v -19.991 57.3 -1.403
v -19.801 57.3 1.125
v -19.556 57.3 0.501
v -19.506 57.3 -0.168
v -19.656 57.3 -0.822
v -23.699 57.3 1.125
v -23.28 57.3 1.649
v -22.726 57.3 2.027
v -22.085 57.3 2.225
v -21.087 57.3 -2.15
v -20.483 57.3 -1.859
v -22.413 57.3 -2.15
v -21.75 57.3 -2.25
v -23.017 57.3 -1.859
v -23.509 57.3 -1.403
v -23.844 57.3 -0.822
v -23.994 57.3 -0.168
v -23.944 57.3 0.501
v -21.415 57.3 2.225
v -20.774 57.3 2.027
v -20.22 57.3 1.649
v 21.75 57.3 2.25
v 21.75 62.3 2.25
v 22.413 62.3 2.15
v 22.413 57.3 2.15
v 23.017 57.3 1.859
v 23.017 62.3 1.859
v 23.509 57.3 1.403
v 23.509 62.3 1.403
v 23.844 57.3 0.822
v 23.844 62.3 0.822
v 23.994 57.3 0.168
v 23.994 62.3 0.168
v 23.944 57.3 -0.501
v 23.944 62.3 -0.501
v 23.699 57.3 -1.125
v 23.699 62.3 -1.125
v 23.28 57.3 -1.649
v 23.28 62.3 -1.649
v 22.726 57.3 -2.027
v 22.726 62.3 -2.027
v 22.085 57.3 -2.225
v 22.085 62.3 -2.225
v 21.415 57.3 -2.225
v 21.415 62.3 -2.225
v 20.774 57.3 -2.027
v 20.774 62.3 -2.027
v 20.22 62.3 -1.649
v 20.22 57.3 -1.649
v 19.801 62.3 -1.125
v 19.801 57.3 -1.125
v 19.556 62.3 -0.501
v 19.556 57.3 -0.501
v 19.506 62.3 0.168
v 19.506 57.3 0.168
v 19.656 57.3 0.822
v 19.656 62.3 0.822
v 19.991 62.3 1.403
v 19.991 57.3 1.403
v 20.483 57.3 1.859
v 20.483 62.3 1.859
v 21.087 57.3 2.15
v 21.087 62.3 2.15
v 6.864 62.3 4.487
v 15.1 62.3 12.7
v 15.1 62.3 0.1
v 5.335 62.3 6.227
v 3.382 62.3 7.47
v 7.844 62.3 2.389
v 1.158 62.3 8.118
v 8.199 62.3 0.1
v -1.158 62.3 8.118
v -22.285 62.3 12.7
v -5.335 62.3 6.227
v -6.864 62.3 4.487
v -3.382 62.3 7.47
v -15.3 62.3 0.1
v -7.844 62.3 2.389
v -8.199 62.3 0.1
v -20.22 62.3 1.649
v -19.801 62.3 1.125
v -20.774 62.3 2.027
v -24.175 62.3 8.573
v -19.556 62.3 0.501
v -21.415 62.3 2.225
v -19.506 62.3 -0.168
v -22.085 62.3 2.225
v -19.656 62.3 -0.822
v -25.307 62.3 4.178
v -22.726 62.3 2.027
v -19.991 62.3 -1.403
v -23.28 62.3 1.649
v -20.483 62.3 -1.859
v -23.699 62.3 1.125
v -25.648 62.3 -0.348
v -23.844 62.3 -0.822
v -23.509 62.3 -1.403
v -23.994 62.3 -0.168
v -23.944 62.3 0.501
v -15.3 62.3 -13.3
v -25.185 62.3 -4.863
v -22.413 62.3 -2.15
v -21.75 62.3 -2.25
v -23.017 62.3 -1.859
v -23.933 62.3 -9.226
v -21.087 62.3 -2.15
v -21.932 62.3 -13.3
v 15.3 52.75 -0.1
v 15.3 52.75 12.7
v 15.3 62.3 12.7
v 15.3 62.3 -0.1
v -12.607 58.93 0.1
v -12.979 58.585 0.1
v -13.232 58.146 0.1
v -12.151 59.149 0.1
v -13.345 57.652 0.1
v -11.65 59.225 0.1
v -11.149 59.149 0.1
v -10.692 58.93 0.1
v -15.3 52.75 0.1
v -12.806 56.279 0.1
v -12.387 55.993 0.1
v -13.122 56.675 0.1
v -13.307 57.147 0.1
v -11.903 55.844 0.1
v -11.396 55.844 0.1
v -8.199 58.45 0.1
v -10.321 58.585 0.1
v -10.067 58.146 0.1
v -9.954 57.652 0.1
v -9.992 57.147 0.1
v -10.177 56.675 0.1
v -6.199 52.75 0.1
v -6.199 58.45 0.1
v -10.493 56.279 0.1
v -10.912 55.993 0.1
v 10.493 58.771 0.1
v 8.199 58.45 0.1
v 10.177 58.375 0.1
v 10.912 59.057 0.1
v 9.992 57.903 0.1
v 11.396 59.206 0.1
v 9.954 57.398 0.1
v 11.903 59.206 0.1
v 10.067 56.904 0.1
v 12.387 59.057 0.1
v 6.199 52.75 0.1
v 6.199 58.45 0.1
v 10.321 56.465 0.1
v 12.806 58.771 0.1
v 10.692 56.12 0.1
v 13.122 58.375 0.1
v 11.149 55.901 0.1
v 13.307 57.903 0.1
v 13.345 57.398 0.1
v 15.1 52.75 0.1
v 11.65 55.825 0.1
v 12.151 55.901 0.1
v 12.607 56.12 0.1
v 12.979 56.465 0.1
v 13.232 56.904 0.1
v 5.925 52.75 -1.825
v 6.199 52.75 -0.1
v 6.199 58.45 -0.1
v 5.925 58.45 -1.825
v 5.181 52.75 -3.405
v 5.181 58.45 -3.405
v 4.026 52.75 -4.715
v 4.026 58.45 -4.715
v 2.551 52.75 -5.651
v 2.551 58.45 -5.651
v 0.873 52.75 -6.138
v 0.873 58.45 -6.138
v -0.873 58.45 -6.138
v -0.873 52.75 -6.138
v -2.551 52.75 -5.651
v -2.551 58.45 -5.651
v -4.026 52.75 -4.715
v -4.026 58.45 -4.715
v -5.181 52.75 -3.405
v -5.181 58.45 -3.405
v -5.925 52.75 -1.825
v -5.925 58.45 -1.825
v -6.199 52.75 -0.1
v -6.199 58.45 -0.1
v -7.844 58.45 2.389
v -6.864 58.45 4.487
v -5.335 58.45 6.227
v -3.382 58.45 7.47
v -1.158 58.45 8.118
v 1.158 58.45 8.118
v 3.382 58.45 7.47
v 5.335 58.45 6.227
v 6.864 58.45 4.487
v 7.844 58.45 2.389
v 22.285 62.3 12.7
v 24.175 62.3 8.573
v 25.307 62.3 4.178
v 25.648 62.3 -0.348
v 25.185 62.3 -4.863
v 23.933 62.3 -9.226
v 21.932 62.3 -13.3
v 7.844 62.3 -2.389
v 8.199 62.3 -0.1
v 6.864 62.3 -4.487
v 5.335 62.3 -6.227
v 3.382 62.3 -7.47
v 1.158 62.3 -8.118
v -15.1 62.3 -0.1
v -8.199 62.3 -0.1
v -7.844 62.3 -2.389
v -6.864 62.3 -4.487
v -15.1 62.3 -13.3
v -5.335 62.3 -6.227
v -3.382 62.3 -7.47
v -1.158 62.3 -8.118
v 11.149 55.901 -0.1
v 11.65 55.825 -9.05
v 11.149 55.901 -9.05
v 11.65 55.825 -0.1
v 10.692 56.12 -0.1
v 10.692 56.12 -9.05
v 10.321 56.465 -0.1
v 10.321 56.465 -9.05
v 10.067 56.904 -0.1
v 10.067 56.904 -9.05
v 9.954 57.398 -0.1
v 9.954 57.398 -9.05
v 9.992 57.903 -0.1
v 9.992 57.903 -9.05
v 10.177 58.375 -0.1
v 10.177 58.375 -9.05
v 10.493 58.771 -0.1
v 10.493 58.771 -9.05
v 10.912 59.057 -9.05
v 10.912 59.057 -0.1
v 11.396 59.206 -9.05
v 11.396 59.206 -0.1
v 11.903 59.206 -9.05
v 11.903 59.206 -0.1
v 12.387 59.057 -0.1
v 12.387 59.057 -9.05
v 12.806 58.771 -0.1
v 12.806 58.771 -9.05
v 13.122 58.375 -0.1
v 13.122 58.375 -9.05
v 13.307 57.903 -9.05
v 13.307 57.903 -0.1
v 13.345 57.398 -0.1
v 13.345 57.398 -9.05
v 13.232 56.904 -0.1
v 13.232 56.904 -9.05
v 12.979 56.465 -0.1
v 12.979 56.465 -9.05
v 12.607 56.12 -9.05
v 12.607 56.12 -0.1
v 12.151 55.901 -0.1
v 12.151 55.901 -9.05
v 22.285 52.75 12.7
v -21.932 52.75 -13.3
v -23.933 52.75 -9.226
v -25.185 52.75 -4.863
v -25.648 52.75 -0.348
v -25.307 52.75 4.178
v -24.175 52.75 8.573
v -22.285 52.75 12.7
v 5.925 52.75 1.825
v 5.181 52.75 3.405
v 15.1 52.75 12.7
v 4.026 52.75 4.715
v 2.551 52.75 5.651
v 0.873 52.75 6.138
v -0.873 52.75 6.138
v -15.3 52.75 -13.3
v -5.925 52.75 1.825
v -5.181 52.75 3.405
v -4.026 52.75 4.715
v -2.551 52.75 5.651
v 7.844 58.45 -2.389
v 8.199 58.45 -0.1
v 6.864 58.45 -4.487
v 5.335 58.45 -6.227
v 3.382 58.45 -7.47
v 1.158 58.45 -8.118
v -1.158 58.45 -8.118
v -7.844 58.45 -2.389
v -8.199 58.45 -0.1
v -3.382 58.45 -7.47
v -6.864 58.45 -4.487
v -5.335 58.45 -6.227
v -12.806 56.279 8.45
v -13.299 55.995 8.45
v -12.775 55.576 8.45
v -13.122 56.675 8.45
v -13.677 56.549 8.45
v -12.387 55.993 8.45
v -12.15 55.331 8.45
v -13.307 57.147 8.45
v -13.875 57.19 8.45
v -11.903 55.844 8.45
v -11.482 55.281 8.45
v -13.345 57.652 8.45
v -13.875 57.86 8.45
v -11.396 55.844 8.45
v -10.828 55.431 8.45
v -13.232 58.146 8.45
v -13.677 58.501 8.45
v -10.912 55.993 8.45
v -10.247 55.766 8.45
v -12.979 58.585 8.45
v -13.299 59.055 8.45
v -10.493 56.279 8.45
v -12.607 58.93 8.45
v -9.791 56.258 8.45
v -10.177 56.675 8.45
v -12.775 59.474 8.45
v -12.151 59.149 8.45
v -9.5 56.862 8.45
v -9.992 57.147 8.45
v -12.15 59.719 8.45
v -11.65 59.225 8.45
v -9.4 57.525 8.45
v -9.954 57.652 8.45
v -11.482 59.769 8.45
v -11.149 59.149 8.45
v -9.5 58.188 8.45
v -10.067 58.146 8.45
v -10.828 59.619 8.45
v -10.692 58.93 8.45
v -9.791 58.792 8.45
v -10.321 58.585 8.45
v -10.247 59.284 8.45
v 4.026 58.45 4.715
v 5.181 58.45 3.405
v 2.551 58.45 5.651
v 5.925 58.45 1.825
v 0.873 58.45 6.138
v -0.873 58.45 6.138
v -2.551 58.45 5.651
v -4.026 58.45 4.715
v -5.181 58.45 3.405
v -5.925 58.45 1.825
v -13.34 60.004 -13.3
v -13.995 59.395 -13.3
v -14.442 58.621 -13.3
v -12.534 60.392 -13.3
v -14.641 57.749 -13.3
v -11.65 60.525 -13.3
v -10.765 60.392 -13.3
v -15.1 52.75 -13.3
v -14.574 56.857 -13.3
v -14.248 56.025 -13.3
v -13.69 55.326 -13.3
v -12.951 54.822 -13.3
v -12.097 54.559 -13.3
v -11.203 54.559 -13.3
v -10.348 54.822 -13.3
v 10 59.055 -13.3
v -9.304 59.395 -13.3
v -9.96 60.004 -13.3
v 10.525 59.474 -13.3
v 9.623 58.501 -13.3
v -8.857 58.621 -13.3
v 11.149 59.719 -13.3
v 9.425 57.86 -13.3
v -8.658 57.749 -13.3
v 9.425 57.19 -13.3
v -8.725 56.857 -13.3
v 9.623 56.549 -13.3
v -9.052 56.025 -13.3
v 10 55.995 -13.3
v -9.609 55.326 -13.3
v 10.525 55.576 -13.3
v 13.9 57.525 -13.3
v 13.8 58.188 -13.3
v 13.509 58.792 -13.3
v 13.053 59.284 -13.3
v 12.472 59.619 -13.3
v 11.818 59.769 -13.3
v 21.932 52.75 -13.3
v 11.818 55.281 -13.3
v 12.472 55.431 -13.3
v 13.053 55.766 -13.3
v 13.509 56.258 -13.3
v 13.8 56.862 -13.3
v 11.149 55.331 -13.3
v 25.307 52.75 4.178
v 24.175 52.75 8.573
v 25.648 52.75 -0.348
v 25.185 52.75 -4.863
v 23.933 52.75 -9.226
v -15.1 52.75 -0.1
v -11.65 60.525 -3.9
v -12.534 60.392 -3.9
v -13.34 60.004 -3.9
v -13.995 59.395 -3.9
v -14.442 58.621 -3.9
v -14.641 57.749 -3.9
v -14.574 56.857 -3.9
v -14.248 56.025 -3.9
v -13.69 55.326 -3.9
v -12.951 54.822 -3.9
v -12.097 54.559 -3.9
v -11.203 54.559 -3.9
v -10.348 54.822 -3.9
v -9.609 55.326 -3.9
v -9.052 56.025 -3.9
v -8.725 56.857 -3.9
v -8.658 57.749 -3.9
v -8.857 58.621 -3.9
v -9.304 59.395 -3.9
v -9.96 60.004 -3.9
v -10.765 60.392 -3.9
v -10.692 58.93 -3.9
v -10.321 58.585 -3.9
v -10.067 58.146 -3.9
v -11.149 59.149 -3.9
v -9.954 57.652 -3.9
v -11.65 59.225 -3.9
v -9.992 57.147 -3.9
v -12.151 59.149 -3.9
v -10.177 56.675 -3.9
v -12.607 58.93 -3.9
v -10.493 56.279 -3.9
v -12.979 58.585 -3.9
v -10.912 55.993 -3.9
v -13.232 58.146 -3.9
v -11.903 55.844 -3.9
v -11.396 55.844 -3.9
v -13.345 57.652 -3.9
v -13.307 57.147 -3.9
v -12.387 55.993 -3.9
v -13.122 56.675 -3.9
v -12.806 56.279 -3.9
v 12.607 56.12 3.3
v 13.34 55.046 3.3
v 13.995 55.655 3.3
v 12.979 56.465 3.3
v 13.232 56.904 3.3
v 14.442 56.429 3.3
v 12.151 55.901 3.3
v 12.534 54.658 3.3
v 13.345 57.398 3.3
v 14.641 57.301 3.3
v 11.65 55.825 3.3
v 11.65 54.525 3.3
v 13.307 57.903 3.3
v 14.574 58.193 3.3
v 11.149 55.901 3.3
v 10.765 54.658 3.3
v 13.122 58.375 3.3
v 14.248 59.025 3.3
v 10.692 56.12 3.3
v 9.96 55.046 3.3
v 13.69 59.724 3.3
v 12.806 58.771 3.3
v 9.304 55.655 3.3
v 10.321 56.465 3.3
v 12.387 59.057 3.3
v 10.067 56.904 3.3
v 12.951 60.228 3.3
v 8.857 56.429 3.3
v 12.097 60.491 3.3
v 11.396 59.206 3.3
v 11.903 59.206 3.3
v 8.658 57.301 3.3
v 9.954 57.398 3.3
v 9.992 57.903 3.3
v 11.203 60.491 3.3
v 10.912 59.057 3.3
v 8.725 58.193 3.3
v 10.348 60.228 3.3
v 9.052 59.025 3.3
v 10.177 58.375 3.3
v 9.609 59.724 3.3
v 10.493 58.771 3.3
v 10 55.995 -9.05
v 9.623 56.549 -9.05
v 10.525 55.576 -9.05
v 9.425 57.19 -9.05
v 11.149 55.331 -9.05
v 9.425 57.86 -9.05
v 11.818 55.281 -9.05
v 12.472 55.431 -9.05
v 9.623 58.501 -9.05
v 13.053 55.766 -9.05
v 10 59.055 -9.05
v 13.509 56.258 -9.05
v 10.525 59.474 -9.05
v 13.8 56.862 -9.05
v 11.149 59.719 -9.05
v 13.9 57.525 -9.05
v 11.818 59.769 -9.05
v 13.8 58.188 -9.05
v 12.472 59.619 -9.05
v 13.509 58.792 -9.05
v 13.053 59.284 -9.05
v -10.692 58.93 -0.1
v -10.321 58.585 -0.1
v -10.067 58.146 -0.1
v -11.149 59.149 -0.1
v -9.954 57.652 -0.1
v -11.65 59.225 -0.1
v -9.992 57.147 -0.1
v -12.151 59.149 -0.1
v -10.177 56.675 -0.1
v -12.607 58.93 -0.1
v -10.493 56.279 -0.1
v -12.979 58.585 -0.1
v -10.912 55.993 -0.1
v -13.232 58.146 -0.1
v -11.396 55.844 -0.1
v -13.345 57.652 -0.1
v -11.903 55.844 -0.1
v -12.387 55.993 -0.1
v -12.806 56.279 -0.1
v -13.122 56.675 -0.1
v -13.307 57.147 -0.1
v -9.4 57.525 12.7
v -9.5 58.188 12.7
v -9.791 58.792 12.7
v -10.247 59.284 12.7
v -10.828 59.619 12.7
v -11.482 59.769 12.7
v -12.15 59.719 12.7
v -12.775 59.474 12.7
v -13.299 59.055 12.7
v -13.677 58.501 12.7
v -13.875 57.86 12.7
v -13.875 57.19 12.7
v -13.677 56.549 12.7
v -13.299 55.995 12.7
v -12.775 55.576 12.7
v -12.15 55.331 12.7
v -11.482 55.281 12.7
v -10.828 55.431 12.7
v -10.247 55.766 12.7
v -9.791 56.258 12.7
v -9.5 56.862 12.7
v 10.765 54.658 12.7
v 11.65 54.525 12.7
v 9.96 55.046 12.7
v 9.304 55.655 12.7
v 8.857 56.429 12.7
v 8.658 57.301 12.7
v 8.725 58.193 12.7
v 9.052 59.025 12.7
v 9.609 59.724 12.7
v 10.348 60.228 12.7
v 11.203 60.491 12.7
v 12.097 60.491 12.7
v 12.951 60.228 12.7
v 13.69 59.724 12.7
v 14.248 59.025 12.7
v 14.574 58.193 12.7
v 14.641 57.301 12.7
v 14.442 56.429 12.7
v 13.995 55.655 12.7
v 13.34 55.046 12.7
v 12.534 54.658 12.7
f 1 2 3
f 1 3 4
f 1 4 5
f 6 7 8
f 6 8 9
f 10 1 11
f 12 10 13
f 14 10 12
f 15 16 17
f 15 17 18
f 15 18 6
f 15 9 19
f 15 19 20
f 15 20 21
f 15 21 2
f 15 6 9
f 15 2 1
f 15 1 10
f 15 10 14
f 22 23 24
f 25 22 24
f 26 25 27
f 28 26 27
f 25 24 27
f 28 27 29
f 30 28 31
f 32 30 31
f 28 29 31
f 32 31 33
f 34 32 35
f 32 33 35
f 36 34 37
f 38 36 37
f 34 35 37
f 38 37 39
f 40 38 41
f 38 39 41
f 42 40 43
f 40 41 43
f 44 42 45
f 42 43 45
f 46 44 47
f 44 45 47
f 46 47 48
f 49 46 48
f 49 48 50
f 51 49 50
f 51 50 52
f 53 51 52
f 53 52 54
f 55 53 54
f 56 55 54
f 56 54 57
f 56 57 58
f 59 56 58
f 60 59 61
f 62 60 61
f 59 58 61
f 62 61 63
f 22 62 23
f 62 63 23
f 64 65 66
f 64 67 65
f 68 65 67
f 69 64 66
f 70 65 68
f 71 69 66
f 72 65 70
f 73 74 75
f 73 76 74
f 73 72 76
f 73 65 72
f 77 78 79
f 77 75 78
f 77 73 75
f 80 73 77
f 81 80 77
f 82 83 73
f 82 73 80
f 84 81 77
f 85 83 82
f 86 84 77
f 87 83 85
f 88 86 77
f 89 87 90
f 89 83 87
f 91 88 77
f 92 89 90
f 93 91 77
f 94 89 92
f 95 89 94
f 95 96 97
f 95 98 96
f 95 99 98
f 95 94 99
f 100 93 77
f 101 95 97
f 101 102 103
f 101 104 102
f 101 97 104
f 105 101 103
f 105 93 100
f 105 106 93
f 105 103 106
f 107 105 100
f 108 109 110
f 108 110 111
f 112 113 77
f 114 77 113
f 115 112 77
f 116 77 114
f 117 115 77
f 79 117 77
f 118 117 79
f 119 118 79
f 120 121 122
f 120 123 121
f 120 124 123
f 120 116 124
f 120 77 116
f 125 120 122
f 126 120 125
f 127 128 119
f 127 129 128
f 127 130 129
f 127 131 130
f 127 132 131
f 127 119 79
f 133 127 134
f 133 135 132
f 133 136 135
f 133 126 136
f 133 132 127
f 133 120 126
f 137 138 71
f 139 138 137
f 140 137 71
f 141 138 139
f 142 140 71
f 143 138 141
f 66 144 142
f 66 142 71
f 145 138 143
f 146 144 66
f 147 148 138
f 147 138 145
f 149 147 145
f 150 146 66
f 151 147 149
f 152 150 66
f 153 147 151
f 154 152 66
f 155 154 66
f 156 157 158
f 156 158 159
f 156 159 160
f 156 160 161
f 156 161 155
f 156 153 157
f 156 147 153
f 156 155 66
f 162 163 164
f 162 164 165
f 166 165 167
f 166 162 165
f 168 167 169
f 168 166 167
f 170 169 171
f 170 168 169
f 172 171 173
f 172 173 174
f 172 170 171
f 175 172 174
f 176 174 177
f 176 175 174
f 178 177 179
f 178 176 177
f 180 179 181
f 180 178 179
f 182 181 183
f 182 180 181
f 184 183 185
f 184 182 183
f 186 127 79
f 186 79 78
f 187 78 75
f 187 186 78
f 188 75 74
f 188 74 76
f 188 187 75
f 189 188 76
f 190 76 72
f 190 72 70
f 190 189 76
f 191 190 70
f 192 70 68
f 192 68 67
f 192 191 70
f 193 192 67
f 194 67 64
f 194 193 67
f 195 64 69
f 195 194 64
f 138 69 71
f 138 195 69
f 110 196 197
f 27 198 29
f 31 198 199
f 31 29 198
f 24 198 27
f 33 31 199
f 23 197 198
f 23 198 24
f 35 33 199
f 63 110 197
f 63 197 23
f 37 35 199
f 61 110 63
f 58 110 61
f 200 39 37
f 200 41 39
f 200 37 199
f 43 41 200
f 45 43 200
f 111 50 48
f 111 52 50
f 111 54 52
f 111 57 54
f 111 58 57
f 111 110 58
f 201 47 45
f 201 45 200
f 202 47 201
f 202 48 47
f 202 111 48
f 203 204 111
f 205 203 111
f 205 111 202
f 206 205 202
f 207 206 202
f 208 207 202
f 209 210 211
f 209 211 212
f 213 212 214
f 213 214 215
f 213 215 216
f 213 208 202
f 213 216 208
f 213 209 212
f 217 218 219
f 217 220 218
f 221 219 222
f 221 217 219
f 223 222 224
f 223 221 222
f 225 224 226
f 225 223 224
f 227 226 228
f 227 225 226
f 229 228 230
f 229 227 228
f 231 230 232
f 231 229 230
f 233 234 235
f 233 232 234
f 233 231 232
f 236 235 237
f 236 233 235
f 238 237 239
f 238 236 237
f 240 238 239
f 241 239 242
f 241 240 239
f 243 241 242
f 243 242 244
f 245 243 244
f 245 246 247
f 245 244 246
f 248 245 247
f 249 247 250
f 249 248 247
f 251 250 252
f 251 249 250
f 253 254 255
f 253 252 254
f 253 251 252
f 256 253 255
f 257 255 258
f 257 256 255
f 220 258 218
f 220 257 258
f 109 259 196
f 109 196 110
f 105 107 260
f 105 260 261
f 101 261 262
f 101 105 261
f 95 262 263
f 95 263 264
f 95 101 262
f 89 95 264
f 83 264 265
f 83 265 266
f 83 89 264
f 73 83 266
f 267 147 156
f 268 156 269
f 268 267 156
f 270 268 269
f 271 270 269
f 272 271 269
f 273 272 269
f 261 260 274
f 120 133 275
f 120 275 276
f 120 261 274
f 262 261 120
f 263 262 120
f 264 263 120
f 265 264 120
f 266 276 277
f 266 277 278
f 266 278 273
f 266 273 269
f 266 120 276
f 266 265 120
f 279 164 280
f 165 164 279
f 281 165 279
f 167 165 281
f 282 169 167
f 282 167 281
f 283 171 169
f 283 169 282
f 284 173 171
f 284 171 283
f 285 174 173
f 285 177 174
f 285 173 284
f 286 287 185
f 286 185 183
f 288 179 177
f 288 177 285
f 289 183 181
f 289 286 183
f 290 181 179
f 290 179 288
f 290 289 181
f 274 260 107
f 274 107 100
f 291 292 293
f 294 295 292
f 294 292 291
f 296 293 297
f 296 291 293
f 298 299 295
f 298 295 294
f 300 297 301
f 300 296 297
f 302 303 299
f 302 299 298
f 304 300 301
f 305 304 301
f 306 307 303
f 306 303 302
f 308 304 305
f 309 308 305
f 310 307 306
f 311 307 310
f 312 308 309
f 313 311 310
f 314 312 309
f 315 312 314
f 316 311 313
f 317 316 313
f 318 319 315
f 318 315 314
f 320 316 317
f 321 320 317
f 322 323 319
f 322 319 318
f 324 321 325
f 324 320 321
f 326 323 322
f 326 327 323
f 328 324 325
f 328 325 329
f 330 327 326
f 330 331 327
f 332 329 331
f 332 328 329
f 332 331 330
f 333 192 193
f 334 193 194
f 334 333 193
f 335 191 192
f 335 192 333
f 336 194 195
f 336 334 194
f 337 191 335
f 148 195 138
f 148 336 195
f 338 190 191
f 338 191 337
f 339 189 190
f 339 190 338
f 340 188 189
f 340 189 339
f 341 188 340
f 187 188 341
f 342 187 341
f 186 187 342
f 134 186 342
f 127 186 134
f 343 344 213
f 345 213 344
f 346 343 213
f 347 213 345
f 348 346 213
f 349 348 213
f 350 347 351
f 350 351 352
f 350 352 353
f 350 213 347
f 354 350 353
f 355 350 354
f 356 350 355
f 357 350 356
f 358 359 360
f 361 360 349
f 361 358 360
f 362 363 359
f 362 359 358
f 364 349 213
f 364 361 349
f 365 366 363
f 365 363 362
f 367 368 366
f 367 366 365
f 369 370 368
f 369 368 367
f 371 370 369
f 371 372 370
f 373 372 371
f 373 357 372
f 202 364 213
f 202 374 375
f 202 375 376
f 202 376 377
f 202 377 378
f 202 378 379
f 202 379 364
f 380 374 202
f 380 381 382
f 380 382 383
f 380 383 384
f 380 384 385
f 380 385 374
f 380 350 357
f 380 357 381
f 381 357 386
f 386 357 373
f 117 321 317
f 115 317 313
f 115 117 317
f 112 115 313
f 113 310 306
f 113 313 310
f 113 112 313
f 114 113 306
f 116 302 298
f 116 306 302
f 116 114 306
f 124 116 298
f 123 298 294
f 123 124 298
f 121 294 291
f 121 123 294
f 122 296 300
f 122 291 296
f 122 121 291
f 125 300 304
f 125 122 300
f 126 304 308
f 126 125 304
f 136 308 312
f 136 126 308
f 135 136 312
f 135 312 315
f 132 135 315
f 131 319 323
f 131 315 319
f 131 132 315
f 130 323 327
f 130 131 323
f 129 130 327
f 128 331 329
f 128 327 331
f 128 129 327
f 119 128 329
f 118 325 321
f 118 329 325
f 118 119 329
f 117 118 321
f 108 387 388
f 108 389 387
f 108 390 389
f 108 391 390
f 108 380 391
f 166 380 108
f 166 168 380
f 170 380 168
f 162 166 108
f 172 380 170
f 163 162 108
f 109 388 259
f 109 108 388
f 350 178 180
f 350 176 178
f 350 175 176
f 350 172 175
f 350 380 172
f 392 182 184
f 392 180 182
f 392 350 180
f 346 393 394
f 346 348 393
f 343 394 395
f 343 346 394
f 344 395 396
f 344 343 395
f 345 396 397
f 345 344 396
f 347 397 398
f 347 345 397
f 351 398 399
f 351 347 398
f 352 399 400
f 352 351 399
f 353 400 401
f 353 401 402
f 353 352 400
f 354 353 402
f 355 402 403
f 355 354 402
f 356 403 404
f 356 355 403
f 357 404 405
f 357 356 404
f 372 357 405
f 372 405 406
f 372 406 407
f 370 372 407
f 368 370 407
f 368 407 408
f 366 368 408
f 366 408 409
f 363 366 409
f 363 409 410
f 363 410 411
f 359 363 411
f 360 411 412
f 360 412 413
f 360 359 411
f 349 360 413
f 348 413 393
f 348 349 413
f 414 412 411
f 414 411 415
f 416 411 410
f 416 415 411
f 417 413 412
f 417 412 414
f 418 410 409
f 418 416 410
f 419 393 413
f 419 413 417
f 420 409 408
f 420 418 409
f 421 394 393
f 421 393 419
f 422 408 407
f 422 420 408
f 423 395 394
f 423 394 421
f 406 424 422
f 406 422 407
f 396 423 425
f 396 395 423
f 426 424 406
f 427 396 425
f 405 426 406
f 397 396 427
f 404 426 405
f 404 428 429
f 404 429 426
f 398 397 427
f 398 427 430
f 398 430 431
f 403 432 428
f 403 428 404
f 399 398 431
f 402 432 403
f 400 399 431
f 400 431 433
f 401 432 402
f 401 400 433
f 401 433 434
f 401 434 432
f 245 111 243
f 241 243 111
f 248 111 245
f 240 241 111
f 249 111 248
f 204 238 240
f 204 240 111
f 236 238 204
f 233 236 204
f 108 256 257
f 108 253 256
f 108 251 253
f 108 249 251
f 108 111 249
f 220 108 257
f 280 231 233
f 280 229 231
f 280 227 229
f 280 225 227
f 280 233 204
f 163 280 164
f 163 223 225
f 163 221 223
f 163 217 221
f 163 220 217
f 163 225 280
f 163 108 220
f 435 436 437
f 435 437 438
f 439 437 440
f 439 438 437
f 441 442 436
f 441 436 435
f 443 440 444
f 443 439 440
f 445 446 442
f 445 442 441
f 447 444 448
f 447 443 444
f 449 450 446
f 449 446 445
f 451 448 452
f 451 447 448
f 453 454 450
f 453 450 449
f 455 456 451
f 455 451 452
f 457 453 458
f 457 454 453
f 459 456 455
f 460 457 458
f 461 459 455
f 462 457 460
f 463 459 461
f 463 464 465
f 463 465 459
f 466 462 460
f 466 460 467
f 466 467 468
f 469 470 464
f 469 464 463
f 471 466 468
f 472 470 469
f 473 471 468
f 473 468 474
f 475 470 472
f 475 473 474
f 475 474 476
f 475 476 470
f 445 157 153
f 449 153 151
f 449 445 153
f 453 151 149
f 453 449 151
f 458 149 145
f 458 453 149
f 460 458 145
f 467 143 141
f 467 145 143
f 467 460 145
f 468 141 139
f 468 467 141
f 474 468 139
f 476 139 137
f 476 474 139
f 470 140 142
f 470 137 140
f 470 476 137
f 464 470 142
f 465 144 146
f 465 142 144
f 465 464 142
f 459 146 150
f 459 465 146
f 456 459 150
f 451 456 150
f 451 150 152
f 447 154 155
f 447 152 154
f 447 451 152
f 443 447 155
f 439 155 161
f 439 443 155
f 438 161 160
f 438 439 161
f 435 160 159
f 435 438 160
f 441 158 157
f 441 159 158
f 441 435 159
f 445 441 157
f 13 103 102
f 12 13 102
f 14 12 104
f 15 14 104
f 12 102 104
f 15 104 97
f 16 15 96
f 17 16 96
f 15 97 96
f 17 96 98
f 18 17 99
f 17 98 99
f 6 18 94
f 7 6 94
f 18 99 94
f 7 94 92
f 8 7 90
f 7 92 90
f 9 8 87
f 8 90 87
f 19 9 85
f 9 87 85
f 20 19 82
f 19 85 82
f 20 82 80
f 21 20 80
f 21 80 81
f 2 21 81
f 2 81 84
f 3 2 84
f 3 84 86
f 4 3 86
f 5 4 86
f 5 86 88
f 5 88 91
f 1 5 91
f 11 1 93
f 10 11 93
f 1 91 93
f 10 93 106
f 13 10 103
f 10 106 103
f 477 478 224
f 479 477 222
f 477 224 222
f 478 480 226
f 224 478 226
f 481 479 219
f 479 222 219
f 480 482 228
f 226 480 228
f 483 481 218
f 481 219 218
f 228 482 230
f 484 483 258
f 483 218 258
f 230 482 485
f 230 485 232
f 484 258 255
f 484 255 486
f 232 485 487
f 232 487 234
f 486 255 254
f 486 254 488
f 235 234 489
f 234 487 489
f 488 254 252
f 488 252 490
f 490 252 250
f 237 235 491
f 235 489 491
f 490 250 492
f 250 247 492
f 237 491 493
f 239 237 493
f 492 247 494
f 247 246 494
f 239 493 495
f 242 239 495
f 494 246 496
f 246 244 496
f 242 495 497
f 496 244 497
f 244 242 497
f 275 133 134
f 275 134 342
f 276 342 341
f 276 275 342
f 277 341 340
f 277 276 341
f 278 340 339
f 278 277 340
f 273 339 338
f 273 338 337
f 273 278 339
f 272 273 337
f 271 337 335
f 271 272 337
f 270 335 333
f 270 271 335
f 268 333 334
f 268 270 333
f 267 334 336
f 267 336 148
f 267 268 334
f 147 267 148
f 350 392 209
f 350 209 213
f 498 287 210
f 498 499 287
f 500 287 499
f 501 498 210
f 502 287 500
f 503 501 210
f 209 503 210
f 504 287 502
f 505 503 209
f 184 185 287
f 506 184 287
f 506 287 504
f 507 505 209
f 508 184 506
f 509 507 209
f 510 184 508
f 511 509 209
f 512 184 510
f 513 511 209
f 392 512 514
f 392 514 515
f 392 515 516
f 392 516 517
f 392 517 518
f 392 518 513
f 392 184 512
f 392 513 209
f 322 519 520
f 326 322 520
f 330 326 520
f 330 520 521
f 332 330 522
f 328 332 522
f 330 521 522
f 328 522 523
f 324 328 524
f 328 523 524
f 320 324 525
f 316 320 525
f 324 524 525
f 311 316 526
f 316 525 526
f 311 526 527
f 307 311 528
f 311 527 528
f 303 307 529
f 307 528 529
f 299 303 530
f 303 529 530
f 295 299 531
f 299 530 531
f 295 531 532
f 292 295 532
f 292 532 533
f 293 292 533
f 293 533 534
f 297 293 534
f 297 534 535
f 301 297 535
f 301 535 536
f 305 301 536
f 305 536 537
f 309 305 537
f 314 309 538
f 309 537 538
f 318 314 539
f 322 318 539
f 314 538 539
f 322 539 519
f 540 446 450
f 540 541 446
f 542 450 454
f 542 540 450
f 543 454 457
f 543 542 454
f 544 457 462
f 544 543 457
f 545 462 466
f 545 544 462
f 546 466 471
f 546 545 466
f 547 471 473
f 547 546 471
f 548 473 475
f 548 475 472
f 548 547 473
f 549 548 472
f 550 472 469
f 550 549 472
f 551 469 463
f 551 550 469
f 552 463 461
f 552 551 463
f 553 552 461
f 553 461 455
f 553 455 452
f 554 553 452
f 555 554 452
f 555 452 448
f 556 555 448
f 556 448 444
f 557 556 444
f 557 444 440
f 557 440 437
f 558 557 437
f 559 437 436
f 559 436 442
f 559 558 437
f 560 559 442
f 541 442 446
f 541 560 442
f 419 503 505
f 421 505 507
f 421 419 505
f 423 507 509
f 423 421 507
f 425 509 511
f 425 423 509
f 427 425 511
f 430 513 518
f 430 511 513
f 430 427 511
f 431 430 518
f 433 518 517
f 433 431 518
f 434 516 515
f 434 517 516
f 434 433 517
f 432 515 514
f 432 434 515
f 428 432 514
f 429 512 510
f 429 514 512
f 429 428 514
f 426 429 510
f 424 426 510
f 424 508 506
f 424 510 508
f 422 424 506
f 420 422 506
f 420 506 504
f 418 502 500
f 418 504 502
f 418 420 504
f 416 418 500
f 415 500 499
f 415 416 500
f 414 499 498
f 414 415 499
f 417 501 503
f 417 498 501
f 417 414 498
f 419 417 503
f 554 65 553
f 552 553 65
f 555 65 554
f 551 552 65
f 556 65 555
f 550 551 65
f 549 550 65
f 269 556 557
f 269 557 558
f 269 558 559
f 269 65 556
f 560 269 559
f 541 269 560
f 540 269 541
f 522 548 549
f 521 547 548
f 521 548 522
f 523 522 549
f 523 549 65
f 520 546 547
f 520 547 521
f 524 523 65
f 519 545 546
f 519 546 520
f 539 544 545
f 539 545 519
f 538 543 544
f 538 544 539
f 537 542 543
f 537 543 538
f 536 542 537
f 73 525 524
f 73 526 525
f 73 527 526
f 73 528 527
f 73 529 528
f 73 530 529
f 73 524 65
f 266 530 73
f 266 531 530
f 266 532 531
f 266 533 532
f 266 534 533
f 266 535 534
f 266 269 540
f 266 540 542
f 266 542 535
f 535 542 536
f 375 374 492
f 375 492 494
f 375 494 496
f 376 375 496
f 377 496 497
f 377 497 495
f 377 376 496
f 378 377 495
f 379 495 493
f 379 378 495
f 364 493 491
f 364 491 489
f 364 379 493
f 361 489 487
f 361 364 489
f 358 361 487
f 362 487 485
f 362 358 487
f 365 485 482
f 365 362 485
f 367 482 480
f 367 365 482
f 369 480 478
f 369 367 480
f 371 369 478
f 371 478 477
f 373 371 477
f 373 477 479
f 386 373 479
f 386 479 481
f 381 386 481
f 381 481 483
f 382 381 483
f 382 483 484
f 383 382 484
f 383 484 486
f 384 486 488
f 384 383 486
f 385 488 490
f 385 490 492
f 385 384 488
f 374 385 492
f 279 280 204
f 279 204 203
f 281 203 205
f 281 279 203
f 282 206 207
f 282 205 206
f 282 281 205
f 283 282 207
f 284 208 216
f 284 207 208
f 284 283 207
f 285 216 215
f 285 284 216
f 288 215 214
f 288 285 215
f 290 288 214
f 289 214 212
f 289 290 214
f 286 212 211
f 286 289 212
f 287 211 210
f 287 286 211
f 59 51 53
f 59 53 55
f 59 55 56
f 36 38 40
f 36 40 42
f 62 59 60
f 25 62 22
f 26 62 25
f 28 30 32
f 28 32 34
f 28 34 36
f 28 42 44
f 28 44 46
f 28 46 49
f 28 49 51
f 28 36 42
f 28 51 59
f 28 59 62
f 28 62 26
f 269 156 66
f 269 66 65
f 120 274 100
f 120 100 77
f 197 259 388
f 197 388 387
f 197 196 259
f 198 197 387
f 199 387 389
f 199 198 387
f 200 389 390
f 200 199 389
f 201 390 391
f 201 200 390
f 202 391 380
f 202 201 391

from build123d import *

# Parameters (mm, degrees)
CUT_EXTRUDE1_DEPTH      = 38.510631826
CUT_EXTRUDE1_DEPTH_BACK = 38.510631826
SKETCH14_R              = 2.25
CUT_EXTRUDE4_DEPTH      = 4.25
CUT_EXTRUDE5_START      = -26
SKETCH14_3_R            = 2.25
CUT_EXTRUDE5_DEPTH      = 4.25
SKETCH15_R              = 2.25
CUT_EXTRUDE6_DEPTH      = 5


with BuildPart() as part:
    # Sketch1 → Revolve1 (revolve)
    with BuildSketch(Plane.XY, mode=Mode.PRIVATE) as revolve1_sk:
        Polygon((6.2, 58.45), (6.2, 52.75), (25.65, 52.75), (25.65, 62.3), (8.2, 62.3), (8.2, 58.45), align=None)
    revolve(revolve1_sk.sketch.rotate(Axis((0, 0, 0), (0, 1, 0)), 90), axis=Axis((0, 0, 0), (0, 1, 0)))

    # Sketch2 → Cut-Extrude1 (cut, two sides: drawn at the far end of the back side and taken through both)
    with BuildSketch(Plane(origin=(0, 62.3, 0), x_dir=(1, 0, 0), z_dir=(0, 1, 0)).offset(-CUT_EXTRUDE1_DEPTH_BACK)):
        with BuildLine():
            Line((15.1, -12.7), (-22.285252971, -12.7))
            ThreePointArc((-22.285252971, -12.7), (0, -25.65), (22.285252971, -12.7))
            Line((22.285252971, -12.7), (15.3, -12.7))
            Line((15.3, -12.7), (15.2, -12.7))
            Line((15.2, -12.7), (15.1, -12.7))
        make_face()
        with BuildLine():
            ThreePointArc((21.932453123, 13.3), (0, 25.65), (-21.932453123, 13.3))
            Line((-21.932453123, 13.3), (-15.3, 13.3))
            Line((-15.3, 13.3), (-15.2, 13.3))
            Line((-15.2, 13.3), (-15.1, 13.3))
            Line((-15.1, 13.3), (21.932453123, 13.3))
        make_face()
        with BuildLine():
            Line((-8.199390221, -0.1), (8.199390221, -0.1))
            ThreePointArc((8.199390221, -0.1), (8.199847554, -0.05000093), (8.2, 0))
            Line((8.2, 0), (-8.2, 0))
            ThreePointArc((-8.2, 0), (-8.199847554, -0.05000093), (-8.199390221, -0.1))
        make_face()
        with BuildLine():
            Line((-8.2, 0), (8.2, 0))
            ThreePointArc((8.2, 0), (8.199847554, 0.05000093), (8.199390221, 0.1))
            Line((8.199390221, 0.1), (-8.199390221, 0.1))
            ThreePointArc((-8.199390221, 0.1), (-8.199847554, 0.05000093), (-8.2, 0))
        make_face()
        with BuildLine():
            Line((-15.2, 13.3), (-15.3, 13.3))
            Line((-15.3, 13.3), (-15.3, -0.1))
            Line((-15.3, -0.1), (-8.199390221, -0.1))
            ThreePointArc((-8.199390221, -0.1), (-8.199847554, -0.05000093), (-8.2, 0))
            Line((-8.2, 0), (-15.2, 0))
            Line((-15.2, 0), (-15.2, 13.3))
        make_face()
        with BuildLine():
            Line((-15.1, 13.3), (-15.2, 13.3))
            Line((-15.2, 13.3), (-15.2, 0))
            Line((-15.2, 0), (-8.2, 0))
            ThreePointArc((-8.2, 0), (-8.199847554, 0.05000093), (-8.199390221, 0.1))
            Line((-8.199390221, 0.1), (-15.1, 0.1))
            Line((-15.1, 0.1), (-15.1, 13.3))
        make_face()
        with BuildLine():
            Line((15.1, -0.1), (15.1, -12.7))
            Line((15.1, -12.7), (15.2, -12.7))
            Line((15.2, -12.7), (15.2, 0))
            Line((15.2, 0), (8.2, 0))
            ThreePointArc((8.2, 0), (8.199847554, -0.05000093), (8.199390221, -0.1))
            Line((8.199390221, -0.1), (15.1, -0.1))
        make_face()
        with BuildLine():
            Line((15.2, 0), (15.2, -12.7))
            Line((15.2, -12.7), (15.3, -12.7))
            Line((15.3, -12.7), (15.3, 0.1))
            Line((15.3, 0.1), (8.199390221, 0.1))
            ThreePointArc((8.199390221, 0.1), (8.199847554, 0.05000093), (8.2, 0))
            Line((8.2, 0), (15.2, 0))
        make_face()
    extrude(amount=CUT_EXTRUDE1_DEPTH + CUT_EXTRUDE1_DEPTH_BACK, mode=Mode.SUBTRACT)


with BuildPart() as cut_extrude1_piece_1:
    # of the separate pieces the step leaves, piece 1, a body of its own (cut_extrude1_pieces)
    add(part.part.solids().sort_by_distance((-6.199193496, 52.75, -0.1))[0])


with BuildPart() as cut_extrude1_piece_2:
    # of the separate pieces the step leaves, piece 2, a body of its own (cut_extrude1_pieces)
    add(part.part.solids().sort_by_distance((-6.199193496, 58.45, 0.1))[0])


with BuildPart() as cbore_for_m3_hex_socket_head_cap_screw3_tool:
    # Sketch9 → CBORE for M3 Hex Socket Head Cap Screw3 (revolve)
    with BuildSketch(Plane(origin=(-11.649695111, 57.525, -13.3), x_dir=(0, 1, 0), z_dir=(1, 0, 0))):
        Polygon((0, 0), (0, 26.00025), (1.7, 26.00025), (1.7, 9.4), (3, 9.4), (3, 0), align=None)
    revolve(axis=Axis((-11.649695111, 57.525, -19.65), (0, 0, 1)))


with BuildPart() as cut_extrude1_piece_1_1:
    add(cut_extrude1_piece_1.part)

    # CBORE for M3 Hex Socket Head Cap Screw3: cut by cbore_for_m3_hex_socket_head_cap_screw3_tool
    add(cbore_for_m3_hex_socket_head_cap_screw3_tool.part, mode=Mode.SUBTRACT)


with BuildPart() as cut_extrude1_piece_2_1:
    add(cut_extrude1_piece_2.part)

    # CBORE for M3 Hex Socket Head Cap Screw3: cut by cbore_for_m3_hex_socket_head_cap_screw3_tool
    add(cbore_for_m3_hex_socket_head_cap_screw3_tool.part, mode=Mode.SUBTRACT)


with BuildPart() as cbore_for_m3_hex_socket_head_cap_screw4_tool:
    # Sketch13 → CBORE for M3 Hex Socket Head Cap Screw4 (revolve)
    with BuildSketch(Plane(origin=(11.649695111, 57.525, 12.7), x_dir=(0, -1, 0), z_dir=(1, 0, 0))):
        Polygon((0, 0), (0, 26.00025), (1.7, 26.00025), (1.7, 9.4), (3, 9.4), (3, 0), align=None)
    revolve(axis=Axis((11.649695111, 57.525, 19.05), (0, 0, -1)))


with BuildPart() as cut_extrude1_piece_1_2:
    add(cut_extrude1_piece_1_1.part)

    # CBORE for M3 Hex Socket Head Cap Screw4: cut by cbore_for_m3_hex_socket_head_cap_screw4_tool
    add(cbore_for_m3_hex_socket_head_cap_screw4_tool.part, mode=Mode.SUBTRACT)

    # Sketch14<3> → Cut-Extrude5 (cut)
    with BuildSketch(Plane.XY.offset(12.7).offset(CUT_EXTRUDE5_START)):
        with Locations((11.649695111, 57.525)):
            Circle(SKETCH14_3_R)
    extrude(amount=CUT_EXTRUDE5_DEPTH, mode=Mode.SUBTRACT)


with BuildPart() as cut_extrude1_piece_2_2:
    add(cut_extrude1_piece_2_1.part)

    # CBORE for M3 Hex Socket Head Cap Screw4: cut by cbore_for_m3_hex_socket_head_cap_screw4_tool
    add(cbore_for_m3_hex_socket_head_cap_screw4_tool.part, mode=Mode.SUBTRACT)

    # Sketch14 → Cut-Extrude4 (cut)
    with BuildSketch(Plane.XY.offset(12.7)):
        with Locations((-11.649695111, 57.525)):
            Circle(SKETCH14_R)
    extrude(amount=-CUT_EXTRUDE4_DEPTH, mode=Mode.SUBTRACT)


with BuildPart() as cut_extrude6_tool:
    # Sketch15 → Cut-Extrude6 (new body)
    with BuildSketch(Plane(origin=(0, 62.3, 0), x_dir=(1, 0, 0), z_dir=(0, 1, 0))):
        with Locations(Location((-21.75, 0, 0), (0, 0, 90))):
            Circle(SKETCH15_R)
        with Locations(Location((21.75, 0, 0), (0, 0, 270))):
            Circle(SKETCH15_R)
    extrude(amount=-CUT_EXTRUDE6_DEPTH)


with BuildPart() as cut_extrude1_piece_1_3:
    add(cut_extrude1_piece_1_2.part)

    # Cut-Extrude6: cut by cut_extrude6_tool
    add(cut_extrude6_tool.part, mode=Mode.SUBTRACT)


with BuildPart() as cut_extrude1_piece_2_3:
    add(cut_extrude1_piece_2_2.part)

    # Cut-Extrude6: cut by cut_extrude6_tool
    add(cut_extrude6_tool.part, mode=Mode.SUBTRACT)


solid = Compound([cut_extrude1_piece_1_3.part, cut_extrude1_piece_2_3.part])
